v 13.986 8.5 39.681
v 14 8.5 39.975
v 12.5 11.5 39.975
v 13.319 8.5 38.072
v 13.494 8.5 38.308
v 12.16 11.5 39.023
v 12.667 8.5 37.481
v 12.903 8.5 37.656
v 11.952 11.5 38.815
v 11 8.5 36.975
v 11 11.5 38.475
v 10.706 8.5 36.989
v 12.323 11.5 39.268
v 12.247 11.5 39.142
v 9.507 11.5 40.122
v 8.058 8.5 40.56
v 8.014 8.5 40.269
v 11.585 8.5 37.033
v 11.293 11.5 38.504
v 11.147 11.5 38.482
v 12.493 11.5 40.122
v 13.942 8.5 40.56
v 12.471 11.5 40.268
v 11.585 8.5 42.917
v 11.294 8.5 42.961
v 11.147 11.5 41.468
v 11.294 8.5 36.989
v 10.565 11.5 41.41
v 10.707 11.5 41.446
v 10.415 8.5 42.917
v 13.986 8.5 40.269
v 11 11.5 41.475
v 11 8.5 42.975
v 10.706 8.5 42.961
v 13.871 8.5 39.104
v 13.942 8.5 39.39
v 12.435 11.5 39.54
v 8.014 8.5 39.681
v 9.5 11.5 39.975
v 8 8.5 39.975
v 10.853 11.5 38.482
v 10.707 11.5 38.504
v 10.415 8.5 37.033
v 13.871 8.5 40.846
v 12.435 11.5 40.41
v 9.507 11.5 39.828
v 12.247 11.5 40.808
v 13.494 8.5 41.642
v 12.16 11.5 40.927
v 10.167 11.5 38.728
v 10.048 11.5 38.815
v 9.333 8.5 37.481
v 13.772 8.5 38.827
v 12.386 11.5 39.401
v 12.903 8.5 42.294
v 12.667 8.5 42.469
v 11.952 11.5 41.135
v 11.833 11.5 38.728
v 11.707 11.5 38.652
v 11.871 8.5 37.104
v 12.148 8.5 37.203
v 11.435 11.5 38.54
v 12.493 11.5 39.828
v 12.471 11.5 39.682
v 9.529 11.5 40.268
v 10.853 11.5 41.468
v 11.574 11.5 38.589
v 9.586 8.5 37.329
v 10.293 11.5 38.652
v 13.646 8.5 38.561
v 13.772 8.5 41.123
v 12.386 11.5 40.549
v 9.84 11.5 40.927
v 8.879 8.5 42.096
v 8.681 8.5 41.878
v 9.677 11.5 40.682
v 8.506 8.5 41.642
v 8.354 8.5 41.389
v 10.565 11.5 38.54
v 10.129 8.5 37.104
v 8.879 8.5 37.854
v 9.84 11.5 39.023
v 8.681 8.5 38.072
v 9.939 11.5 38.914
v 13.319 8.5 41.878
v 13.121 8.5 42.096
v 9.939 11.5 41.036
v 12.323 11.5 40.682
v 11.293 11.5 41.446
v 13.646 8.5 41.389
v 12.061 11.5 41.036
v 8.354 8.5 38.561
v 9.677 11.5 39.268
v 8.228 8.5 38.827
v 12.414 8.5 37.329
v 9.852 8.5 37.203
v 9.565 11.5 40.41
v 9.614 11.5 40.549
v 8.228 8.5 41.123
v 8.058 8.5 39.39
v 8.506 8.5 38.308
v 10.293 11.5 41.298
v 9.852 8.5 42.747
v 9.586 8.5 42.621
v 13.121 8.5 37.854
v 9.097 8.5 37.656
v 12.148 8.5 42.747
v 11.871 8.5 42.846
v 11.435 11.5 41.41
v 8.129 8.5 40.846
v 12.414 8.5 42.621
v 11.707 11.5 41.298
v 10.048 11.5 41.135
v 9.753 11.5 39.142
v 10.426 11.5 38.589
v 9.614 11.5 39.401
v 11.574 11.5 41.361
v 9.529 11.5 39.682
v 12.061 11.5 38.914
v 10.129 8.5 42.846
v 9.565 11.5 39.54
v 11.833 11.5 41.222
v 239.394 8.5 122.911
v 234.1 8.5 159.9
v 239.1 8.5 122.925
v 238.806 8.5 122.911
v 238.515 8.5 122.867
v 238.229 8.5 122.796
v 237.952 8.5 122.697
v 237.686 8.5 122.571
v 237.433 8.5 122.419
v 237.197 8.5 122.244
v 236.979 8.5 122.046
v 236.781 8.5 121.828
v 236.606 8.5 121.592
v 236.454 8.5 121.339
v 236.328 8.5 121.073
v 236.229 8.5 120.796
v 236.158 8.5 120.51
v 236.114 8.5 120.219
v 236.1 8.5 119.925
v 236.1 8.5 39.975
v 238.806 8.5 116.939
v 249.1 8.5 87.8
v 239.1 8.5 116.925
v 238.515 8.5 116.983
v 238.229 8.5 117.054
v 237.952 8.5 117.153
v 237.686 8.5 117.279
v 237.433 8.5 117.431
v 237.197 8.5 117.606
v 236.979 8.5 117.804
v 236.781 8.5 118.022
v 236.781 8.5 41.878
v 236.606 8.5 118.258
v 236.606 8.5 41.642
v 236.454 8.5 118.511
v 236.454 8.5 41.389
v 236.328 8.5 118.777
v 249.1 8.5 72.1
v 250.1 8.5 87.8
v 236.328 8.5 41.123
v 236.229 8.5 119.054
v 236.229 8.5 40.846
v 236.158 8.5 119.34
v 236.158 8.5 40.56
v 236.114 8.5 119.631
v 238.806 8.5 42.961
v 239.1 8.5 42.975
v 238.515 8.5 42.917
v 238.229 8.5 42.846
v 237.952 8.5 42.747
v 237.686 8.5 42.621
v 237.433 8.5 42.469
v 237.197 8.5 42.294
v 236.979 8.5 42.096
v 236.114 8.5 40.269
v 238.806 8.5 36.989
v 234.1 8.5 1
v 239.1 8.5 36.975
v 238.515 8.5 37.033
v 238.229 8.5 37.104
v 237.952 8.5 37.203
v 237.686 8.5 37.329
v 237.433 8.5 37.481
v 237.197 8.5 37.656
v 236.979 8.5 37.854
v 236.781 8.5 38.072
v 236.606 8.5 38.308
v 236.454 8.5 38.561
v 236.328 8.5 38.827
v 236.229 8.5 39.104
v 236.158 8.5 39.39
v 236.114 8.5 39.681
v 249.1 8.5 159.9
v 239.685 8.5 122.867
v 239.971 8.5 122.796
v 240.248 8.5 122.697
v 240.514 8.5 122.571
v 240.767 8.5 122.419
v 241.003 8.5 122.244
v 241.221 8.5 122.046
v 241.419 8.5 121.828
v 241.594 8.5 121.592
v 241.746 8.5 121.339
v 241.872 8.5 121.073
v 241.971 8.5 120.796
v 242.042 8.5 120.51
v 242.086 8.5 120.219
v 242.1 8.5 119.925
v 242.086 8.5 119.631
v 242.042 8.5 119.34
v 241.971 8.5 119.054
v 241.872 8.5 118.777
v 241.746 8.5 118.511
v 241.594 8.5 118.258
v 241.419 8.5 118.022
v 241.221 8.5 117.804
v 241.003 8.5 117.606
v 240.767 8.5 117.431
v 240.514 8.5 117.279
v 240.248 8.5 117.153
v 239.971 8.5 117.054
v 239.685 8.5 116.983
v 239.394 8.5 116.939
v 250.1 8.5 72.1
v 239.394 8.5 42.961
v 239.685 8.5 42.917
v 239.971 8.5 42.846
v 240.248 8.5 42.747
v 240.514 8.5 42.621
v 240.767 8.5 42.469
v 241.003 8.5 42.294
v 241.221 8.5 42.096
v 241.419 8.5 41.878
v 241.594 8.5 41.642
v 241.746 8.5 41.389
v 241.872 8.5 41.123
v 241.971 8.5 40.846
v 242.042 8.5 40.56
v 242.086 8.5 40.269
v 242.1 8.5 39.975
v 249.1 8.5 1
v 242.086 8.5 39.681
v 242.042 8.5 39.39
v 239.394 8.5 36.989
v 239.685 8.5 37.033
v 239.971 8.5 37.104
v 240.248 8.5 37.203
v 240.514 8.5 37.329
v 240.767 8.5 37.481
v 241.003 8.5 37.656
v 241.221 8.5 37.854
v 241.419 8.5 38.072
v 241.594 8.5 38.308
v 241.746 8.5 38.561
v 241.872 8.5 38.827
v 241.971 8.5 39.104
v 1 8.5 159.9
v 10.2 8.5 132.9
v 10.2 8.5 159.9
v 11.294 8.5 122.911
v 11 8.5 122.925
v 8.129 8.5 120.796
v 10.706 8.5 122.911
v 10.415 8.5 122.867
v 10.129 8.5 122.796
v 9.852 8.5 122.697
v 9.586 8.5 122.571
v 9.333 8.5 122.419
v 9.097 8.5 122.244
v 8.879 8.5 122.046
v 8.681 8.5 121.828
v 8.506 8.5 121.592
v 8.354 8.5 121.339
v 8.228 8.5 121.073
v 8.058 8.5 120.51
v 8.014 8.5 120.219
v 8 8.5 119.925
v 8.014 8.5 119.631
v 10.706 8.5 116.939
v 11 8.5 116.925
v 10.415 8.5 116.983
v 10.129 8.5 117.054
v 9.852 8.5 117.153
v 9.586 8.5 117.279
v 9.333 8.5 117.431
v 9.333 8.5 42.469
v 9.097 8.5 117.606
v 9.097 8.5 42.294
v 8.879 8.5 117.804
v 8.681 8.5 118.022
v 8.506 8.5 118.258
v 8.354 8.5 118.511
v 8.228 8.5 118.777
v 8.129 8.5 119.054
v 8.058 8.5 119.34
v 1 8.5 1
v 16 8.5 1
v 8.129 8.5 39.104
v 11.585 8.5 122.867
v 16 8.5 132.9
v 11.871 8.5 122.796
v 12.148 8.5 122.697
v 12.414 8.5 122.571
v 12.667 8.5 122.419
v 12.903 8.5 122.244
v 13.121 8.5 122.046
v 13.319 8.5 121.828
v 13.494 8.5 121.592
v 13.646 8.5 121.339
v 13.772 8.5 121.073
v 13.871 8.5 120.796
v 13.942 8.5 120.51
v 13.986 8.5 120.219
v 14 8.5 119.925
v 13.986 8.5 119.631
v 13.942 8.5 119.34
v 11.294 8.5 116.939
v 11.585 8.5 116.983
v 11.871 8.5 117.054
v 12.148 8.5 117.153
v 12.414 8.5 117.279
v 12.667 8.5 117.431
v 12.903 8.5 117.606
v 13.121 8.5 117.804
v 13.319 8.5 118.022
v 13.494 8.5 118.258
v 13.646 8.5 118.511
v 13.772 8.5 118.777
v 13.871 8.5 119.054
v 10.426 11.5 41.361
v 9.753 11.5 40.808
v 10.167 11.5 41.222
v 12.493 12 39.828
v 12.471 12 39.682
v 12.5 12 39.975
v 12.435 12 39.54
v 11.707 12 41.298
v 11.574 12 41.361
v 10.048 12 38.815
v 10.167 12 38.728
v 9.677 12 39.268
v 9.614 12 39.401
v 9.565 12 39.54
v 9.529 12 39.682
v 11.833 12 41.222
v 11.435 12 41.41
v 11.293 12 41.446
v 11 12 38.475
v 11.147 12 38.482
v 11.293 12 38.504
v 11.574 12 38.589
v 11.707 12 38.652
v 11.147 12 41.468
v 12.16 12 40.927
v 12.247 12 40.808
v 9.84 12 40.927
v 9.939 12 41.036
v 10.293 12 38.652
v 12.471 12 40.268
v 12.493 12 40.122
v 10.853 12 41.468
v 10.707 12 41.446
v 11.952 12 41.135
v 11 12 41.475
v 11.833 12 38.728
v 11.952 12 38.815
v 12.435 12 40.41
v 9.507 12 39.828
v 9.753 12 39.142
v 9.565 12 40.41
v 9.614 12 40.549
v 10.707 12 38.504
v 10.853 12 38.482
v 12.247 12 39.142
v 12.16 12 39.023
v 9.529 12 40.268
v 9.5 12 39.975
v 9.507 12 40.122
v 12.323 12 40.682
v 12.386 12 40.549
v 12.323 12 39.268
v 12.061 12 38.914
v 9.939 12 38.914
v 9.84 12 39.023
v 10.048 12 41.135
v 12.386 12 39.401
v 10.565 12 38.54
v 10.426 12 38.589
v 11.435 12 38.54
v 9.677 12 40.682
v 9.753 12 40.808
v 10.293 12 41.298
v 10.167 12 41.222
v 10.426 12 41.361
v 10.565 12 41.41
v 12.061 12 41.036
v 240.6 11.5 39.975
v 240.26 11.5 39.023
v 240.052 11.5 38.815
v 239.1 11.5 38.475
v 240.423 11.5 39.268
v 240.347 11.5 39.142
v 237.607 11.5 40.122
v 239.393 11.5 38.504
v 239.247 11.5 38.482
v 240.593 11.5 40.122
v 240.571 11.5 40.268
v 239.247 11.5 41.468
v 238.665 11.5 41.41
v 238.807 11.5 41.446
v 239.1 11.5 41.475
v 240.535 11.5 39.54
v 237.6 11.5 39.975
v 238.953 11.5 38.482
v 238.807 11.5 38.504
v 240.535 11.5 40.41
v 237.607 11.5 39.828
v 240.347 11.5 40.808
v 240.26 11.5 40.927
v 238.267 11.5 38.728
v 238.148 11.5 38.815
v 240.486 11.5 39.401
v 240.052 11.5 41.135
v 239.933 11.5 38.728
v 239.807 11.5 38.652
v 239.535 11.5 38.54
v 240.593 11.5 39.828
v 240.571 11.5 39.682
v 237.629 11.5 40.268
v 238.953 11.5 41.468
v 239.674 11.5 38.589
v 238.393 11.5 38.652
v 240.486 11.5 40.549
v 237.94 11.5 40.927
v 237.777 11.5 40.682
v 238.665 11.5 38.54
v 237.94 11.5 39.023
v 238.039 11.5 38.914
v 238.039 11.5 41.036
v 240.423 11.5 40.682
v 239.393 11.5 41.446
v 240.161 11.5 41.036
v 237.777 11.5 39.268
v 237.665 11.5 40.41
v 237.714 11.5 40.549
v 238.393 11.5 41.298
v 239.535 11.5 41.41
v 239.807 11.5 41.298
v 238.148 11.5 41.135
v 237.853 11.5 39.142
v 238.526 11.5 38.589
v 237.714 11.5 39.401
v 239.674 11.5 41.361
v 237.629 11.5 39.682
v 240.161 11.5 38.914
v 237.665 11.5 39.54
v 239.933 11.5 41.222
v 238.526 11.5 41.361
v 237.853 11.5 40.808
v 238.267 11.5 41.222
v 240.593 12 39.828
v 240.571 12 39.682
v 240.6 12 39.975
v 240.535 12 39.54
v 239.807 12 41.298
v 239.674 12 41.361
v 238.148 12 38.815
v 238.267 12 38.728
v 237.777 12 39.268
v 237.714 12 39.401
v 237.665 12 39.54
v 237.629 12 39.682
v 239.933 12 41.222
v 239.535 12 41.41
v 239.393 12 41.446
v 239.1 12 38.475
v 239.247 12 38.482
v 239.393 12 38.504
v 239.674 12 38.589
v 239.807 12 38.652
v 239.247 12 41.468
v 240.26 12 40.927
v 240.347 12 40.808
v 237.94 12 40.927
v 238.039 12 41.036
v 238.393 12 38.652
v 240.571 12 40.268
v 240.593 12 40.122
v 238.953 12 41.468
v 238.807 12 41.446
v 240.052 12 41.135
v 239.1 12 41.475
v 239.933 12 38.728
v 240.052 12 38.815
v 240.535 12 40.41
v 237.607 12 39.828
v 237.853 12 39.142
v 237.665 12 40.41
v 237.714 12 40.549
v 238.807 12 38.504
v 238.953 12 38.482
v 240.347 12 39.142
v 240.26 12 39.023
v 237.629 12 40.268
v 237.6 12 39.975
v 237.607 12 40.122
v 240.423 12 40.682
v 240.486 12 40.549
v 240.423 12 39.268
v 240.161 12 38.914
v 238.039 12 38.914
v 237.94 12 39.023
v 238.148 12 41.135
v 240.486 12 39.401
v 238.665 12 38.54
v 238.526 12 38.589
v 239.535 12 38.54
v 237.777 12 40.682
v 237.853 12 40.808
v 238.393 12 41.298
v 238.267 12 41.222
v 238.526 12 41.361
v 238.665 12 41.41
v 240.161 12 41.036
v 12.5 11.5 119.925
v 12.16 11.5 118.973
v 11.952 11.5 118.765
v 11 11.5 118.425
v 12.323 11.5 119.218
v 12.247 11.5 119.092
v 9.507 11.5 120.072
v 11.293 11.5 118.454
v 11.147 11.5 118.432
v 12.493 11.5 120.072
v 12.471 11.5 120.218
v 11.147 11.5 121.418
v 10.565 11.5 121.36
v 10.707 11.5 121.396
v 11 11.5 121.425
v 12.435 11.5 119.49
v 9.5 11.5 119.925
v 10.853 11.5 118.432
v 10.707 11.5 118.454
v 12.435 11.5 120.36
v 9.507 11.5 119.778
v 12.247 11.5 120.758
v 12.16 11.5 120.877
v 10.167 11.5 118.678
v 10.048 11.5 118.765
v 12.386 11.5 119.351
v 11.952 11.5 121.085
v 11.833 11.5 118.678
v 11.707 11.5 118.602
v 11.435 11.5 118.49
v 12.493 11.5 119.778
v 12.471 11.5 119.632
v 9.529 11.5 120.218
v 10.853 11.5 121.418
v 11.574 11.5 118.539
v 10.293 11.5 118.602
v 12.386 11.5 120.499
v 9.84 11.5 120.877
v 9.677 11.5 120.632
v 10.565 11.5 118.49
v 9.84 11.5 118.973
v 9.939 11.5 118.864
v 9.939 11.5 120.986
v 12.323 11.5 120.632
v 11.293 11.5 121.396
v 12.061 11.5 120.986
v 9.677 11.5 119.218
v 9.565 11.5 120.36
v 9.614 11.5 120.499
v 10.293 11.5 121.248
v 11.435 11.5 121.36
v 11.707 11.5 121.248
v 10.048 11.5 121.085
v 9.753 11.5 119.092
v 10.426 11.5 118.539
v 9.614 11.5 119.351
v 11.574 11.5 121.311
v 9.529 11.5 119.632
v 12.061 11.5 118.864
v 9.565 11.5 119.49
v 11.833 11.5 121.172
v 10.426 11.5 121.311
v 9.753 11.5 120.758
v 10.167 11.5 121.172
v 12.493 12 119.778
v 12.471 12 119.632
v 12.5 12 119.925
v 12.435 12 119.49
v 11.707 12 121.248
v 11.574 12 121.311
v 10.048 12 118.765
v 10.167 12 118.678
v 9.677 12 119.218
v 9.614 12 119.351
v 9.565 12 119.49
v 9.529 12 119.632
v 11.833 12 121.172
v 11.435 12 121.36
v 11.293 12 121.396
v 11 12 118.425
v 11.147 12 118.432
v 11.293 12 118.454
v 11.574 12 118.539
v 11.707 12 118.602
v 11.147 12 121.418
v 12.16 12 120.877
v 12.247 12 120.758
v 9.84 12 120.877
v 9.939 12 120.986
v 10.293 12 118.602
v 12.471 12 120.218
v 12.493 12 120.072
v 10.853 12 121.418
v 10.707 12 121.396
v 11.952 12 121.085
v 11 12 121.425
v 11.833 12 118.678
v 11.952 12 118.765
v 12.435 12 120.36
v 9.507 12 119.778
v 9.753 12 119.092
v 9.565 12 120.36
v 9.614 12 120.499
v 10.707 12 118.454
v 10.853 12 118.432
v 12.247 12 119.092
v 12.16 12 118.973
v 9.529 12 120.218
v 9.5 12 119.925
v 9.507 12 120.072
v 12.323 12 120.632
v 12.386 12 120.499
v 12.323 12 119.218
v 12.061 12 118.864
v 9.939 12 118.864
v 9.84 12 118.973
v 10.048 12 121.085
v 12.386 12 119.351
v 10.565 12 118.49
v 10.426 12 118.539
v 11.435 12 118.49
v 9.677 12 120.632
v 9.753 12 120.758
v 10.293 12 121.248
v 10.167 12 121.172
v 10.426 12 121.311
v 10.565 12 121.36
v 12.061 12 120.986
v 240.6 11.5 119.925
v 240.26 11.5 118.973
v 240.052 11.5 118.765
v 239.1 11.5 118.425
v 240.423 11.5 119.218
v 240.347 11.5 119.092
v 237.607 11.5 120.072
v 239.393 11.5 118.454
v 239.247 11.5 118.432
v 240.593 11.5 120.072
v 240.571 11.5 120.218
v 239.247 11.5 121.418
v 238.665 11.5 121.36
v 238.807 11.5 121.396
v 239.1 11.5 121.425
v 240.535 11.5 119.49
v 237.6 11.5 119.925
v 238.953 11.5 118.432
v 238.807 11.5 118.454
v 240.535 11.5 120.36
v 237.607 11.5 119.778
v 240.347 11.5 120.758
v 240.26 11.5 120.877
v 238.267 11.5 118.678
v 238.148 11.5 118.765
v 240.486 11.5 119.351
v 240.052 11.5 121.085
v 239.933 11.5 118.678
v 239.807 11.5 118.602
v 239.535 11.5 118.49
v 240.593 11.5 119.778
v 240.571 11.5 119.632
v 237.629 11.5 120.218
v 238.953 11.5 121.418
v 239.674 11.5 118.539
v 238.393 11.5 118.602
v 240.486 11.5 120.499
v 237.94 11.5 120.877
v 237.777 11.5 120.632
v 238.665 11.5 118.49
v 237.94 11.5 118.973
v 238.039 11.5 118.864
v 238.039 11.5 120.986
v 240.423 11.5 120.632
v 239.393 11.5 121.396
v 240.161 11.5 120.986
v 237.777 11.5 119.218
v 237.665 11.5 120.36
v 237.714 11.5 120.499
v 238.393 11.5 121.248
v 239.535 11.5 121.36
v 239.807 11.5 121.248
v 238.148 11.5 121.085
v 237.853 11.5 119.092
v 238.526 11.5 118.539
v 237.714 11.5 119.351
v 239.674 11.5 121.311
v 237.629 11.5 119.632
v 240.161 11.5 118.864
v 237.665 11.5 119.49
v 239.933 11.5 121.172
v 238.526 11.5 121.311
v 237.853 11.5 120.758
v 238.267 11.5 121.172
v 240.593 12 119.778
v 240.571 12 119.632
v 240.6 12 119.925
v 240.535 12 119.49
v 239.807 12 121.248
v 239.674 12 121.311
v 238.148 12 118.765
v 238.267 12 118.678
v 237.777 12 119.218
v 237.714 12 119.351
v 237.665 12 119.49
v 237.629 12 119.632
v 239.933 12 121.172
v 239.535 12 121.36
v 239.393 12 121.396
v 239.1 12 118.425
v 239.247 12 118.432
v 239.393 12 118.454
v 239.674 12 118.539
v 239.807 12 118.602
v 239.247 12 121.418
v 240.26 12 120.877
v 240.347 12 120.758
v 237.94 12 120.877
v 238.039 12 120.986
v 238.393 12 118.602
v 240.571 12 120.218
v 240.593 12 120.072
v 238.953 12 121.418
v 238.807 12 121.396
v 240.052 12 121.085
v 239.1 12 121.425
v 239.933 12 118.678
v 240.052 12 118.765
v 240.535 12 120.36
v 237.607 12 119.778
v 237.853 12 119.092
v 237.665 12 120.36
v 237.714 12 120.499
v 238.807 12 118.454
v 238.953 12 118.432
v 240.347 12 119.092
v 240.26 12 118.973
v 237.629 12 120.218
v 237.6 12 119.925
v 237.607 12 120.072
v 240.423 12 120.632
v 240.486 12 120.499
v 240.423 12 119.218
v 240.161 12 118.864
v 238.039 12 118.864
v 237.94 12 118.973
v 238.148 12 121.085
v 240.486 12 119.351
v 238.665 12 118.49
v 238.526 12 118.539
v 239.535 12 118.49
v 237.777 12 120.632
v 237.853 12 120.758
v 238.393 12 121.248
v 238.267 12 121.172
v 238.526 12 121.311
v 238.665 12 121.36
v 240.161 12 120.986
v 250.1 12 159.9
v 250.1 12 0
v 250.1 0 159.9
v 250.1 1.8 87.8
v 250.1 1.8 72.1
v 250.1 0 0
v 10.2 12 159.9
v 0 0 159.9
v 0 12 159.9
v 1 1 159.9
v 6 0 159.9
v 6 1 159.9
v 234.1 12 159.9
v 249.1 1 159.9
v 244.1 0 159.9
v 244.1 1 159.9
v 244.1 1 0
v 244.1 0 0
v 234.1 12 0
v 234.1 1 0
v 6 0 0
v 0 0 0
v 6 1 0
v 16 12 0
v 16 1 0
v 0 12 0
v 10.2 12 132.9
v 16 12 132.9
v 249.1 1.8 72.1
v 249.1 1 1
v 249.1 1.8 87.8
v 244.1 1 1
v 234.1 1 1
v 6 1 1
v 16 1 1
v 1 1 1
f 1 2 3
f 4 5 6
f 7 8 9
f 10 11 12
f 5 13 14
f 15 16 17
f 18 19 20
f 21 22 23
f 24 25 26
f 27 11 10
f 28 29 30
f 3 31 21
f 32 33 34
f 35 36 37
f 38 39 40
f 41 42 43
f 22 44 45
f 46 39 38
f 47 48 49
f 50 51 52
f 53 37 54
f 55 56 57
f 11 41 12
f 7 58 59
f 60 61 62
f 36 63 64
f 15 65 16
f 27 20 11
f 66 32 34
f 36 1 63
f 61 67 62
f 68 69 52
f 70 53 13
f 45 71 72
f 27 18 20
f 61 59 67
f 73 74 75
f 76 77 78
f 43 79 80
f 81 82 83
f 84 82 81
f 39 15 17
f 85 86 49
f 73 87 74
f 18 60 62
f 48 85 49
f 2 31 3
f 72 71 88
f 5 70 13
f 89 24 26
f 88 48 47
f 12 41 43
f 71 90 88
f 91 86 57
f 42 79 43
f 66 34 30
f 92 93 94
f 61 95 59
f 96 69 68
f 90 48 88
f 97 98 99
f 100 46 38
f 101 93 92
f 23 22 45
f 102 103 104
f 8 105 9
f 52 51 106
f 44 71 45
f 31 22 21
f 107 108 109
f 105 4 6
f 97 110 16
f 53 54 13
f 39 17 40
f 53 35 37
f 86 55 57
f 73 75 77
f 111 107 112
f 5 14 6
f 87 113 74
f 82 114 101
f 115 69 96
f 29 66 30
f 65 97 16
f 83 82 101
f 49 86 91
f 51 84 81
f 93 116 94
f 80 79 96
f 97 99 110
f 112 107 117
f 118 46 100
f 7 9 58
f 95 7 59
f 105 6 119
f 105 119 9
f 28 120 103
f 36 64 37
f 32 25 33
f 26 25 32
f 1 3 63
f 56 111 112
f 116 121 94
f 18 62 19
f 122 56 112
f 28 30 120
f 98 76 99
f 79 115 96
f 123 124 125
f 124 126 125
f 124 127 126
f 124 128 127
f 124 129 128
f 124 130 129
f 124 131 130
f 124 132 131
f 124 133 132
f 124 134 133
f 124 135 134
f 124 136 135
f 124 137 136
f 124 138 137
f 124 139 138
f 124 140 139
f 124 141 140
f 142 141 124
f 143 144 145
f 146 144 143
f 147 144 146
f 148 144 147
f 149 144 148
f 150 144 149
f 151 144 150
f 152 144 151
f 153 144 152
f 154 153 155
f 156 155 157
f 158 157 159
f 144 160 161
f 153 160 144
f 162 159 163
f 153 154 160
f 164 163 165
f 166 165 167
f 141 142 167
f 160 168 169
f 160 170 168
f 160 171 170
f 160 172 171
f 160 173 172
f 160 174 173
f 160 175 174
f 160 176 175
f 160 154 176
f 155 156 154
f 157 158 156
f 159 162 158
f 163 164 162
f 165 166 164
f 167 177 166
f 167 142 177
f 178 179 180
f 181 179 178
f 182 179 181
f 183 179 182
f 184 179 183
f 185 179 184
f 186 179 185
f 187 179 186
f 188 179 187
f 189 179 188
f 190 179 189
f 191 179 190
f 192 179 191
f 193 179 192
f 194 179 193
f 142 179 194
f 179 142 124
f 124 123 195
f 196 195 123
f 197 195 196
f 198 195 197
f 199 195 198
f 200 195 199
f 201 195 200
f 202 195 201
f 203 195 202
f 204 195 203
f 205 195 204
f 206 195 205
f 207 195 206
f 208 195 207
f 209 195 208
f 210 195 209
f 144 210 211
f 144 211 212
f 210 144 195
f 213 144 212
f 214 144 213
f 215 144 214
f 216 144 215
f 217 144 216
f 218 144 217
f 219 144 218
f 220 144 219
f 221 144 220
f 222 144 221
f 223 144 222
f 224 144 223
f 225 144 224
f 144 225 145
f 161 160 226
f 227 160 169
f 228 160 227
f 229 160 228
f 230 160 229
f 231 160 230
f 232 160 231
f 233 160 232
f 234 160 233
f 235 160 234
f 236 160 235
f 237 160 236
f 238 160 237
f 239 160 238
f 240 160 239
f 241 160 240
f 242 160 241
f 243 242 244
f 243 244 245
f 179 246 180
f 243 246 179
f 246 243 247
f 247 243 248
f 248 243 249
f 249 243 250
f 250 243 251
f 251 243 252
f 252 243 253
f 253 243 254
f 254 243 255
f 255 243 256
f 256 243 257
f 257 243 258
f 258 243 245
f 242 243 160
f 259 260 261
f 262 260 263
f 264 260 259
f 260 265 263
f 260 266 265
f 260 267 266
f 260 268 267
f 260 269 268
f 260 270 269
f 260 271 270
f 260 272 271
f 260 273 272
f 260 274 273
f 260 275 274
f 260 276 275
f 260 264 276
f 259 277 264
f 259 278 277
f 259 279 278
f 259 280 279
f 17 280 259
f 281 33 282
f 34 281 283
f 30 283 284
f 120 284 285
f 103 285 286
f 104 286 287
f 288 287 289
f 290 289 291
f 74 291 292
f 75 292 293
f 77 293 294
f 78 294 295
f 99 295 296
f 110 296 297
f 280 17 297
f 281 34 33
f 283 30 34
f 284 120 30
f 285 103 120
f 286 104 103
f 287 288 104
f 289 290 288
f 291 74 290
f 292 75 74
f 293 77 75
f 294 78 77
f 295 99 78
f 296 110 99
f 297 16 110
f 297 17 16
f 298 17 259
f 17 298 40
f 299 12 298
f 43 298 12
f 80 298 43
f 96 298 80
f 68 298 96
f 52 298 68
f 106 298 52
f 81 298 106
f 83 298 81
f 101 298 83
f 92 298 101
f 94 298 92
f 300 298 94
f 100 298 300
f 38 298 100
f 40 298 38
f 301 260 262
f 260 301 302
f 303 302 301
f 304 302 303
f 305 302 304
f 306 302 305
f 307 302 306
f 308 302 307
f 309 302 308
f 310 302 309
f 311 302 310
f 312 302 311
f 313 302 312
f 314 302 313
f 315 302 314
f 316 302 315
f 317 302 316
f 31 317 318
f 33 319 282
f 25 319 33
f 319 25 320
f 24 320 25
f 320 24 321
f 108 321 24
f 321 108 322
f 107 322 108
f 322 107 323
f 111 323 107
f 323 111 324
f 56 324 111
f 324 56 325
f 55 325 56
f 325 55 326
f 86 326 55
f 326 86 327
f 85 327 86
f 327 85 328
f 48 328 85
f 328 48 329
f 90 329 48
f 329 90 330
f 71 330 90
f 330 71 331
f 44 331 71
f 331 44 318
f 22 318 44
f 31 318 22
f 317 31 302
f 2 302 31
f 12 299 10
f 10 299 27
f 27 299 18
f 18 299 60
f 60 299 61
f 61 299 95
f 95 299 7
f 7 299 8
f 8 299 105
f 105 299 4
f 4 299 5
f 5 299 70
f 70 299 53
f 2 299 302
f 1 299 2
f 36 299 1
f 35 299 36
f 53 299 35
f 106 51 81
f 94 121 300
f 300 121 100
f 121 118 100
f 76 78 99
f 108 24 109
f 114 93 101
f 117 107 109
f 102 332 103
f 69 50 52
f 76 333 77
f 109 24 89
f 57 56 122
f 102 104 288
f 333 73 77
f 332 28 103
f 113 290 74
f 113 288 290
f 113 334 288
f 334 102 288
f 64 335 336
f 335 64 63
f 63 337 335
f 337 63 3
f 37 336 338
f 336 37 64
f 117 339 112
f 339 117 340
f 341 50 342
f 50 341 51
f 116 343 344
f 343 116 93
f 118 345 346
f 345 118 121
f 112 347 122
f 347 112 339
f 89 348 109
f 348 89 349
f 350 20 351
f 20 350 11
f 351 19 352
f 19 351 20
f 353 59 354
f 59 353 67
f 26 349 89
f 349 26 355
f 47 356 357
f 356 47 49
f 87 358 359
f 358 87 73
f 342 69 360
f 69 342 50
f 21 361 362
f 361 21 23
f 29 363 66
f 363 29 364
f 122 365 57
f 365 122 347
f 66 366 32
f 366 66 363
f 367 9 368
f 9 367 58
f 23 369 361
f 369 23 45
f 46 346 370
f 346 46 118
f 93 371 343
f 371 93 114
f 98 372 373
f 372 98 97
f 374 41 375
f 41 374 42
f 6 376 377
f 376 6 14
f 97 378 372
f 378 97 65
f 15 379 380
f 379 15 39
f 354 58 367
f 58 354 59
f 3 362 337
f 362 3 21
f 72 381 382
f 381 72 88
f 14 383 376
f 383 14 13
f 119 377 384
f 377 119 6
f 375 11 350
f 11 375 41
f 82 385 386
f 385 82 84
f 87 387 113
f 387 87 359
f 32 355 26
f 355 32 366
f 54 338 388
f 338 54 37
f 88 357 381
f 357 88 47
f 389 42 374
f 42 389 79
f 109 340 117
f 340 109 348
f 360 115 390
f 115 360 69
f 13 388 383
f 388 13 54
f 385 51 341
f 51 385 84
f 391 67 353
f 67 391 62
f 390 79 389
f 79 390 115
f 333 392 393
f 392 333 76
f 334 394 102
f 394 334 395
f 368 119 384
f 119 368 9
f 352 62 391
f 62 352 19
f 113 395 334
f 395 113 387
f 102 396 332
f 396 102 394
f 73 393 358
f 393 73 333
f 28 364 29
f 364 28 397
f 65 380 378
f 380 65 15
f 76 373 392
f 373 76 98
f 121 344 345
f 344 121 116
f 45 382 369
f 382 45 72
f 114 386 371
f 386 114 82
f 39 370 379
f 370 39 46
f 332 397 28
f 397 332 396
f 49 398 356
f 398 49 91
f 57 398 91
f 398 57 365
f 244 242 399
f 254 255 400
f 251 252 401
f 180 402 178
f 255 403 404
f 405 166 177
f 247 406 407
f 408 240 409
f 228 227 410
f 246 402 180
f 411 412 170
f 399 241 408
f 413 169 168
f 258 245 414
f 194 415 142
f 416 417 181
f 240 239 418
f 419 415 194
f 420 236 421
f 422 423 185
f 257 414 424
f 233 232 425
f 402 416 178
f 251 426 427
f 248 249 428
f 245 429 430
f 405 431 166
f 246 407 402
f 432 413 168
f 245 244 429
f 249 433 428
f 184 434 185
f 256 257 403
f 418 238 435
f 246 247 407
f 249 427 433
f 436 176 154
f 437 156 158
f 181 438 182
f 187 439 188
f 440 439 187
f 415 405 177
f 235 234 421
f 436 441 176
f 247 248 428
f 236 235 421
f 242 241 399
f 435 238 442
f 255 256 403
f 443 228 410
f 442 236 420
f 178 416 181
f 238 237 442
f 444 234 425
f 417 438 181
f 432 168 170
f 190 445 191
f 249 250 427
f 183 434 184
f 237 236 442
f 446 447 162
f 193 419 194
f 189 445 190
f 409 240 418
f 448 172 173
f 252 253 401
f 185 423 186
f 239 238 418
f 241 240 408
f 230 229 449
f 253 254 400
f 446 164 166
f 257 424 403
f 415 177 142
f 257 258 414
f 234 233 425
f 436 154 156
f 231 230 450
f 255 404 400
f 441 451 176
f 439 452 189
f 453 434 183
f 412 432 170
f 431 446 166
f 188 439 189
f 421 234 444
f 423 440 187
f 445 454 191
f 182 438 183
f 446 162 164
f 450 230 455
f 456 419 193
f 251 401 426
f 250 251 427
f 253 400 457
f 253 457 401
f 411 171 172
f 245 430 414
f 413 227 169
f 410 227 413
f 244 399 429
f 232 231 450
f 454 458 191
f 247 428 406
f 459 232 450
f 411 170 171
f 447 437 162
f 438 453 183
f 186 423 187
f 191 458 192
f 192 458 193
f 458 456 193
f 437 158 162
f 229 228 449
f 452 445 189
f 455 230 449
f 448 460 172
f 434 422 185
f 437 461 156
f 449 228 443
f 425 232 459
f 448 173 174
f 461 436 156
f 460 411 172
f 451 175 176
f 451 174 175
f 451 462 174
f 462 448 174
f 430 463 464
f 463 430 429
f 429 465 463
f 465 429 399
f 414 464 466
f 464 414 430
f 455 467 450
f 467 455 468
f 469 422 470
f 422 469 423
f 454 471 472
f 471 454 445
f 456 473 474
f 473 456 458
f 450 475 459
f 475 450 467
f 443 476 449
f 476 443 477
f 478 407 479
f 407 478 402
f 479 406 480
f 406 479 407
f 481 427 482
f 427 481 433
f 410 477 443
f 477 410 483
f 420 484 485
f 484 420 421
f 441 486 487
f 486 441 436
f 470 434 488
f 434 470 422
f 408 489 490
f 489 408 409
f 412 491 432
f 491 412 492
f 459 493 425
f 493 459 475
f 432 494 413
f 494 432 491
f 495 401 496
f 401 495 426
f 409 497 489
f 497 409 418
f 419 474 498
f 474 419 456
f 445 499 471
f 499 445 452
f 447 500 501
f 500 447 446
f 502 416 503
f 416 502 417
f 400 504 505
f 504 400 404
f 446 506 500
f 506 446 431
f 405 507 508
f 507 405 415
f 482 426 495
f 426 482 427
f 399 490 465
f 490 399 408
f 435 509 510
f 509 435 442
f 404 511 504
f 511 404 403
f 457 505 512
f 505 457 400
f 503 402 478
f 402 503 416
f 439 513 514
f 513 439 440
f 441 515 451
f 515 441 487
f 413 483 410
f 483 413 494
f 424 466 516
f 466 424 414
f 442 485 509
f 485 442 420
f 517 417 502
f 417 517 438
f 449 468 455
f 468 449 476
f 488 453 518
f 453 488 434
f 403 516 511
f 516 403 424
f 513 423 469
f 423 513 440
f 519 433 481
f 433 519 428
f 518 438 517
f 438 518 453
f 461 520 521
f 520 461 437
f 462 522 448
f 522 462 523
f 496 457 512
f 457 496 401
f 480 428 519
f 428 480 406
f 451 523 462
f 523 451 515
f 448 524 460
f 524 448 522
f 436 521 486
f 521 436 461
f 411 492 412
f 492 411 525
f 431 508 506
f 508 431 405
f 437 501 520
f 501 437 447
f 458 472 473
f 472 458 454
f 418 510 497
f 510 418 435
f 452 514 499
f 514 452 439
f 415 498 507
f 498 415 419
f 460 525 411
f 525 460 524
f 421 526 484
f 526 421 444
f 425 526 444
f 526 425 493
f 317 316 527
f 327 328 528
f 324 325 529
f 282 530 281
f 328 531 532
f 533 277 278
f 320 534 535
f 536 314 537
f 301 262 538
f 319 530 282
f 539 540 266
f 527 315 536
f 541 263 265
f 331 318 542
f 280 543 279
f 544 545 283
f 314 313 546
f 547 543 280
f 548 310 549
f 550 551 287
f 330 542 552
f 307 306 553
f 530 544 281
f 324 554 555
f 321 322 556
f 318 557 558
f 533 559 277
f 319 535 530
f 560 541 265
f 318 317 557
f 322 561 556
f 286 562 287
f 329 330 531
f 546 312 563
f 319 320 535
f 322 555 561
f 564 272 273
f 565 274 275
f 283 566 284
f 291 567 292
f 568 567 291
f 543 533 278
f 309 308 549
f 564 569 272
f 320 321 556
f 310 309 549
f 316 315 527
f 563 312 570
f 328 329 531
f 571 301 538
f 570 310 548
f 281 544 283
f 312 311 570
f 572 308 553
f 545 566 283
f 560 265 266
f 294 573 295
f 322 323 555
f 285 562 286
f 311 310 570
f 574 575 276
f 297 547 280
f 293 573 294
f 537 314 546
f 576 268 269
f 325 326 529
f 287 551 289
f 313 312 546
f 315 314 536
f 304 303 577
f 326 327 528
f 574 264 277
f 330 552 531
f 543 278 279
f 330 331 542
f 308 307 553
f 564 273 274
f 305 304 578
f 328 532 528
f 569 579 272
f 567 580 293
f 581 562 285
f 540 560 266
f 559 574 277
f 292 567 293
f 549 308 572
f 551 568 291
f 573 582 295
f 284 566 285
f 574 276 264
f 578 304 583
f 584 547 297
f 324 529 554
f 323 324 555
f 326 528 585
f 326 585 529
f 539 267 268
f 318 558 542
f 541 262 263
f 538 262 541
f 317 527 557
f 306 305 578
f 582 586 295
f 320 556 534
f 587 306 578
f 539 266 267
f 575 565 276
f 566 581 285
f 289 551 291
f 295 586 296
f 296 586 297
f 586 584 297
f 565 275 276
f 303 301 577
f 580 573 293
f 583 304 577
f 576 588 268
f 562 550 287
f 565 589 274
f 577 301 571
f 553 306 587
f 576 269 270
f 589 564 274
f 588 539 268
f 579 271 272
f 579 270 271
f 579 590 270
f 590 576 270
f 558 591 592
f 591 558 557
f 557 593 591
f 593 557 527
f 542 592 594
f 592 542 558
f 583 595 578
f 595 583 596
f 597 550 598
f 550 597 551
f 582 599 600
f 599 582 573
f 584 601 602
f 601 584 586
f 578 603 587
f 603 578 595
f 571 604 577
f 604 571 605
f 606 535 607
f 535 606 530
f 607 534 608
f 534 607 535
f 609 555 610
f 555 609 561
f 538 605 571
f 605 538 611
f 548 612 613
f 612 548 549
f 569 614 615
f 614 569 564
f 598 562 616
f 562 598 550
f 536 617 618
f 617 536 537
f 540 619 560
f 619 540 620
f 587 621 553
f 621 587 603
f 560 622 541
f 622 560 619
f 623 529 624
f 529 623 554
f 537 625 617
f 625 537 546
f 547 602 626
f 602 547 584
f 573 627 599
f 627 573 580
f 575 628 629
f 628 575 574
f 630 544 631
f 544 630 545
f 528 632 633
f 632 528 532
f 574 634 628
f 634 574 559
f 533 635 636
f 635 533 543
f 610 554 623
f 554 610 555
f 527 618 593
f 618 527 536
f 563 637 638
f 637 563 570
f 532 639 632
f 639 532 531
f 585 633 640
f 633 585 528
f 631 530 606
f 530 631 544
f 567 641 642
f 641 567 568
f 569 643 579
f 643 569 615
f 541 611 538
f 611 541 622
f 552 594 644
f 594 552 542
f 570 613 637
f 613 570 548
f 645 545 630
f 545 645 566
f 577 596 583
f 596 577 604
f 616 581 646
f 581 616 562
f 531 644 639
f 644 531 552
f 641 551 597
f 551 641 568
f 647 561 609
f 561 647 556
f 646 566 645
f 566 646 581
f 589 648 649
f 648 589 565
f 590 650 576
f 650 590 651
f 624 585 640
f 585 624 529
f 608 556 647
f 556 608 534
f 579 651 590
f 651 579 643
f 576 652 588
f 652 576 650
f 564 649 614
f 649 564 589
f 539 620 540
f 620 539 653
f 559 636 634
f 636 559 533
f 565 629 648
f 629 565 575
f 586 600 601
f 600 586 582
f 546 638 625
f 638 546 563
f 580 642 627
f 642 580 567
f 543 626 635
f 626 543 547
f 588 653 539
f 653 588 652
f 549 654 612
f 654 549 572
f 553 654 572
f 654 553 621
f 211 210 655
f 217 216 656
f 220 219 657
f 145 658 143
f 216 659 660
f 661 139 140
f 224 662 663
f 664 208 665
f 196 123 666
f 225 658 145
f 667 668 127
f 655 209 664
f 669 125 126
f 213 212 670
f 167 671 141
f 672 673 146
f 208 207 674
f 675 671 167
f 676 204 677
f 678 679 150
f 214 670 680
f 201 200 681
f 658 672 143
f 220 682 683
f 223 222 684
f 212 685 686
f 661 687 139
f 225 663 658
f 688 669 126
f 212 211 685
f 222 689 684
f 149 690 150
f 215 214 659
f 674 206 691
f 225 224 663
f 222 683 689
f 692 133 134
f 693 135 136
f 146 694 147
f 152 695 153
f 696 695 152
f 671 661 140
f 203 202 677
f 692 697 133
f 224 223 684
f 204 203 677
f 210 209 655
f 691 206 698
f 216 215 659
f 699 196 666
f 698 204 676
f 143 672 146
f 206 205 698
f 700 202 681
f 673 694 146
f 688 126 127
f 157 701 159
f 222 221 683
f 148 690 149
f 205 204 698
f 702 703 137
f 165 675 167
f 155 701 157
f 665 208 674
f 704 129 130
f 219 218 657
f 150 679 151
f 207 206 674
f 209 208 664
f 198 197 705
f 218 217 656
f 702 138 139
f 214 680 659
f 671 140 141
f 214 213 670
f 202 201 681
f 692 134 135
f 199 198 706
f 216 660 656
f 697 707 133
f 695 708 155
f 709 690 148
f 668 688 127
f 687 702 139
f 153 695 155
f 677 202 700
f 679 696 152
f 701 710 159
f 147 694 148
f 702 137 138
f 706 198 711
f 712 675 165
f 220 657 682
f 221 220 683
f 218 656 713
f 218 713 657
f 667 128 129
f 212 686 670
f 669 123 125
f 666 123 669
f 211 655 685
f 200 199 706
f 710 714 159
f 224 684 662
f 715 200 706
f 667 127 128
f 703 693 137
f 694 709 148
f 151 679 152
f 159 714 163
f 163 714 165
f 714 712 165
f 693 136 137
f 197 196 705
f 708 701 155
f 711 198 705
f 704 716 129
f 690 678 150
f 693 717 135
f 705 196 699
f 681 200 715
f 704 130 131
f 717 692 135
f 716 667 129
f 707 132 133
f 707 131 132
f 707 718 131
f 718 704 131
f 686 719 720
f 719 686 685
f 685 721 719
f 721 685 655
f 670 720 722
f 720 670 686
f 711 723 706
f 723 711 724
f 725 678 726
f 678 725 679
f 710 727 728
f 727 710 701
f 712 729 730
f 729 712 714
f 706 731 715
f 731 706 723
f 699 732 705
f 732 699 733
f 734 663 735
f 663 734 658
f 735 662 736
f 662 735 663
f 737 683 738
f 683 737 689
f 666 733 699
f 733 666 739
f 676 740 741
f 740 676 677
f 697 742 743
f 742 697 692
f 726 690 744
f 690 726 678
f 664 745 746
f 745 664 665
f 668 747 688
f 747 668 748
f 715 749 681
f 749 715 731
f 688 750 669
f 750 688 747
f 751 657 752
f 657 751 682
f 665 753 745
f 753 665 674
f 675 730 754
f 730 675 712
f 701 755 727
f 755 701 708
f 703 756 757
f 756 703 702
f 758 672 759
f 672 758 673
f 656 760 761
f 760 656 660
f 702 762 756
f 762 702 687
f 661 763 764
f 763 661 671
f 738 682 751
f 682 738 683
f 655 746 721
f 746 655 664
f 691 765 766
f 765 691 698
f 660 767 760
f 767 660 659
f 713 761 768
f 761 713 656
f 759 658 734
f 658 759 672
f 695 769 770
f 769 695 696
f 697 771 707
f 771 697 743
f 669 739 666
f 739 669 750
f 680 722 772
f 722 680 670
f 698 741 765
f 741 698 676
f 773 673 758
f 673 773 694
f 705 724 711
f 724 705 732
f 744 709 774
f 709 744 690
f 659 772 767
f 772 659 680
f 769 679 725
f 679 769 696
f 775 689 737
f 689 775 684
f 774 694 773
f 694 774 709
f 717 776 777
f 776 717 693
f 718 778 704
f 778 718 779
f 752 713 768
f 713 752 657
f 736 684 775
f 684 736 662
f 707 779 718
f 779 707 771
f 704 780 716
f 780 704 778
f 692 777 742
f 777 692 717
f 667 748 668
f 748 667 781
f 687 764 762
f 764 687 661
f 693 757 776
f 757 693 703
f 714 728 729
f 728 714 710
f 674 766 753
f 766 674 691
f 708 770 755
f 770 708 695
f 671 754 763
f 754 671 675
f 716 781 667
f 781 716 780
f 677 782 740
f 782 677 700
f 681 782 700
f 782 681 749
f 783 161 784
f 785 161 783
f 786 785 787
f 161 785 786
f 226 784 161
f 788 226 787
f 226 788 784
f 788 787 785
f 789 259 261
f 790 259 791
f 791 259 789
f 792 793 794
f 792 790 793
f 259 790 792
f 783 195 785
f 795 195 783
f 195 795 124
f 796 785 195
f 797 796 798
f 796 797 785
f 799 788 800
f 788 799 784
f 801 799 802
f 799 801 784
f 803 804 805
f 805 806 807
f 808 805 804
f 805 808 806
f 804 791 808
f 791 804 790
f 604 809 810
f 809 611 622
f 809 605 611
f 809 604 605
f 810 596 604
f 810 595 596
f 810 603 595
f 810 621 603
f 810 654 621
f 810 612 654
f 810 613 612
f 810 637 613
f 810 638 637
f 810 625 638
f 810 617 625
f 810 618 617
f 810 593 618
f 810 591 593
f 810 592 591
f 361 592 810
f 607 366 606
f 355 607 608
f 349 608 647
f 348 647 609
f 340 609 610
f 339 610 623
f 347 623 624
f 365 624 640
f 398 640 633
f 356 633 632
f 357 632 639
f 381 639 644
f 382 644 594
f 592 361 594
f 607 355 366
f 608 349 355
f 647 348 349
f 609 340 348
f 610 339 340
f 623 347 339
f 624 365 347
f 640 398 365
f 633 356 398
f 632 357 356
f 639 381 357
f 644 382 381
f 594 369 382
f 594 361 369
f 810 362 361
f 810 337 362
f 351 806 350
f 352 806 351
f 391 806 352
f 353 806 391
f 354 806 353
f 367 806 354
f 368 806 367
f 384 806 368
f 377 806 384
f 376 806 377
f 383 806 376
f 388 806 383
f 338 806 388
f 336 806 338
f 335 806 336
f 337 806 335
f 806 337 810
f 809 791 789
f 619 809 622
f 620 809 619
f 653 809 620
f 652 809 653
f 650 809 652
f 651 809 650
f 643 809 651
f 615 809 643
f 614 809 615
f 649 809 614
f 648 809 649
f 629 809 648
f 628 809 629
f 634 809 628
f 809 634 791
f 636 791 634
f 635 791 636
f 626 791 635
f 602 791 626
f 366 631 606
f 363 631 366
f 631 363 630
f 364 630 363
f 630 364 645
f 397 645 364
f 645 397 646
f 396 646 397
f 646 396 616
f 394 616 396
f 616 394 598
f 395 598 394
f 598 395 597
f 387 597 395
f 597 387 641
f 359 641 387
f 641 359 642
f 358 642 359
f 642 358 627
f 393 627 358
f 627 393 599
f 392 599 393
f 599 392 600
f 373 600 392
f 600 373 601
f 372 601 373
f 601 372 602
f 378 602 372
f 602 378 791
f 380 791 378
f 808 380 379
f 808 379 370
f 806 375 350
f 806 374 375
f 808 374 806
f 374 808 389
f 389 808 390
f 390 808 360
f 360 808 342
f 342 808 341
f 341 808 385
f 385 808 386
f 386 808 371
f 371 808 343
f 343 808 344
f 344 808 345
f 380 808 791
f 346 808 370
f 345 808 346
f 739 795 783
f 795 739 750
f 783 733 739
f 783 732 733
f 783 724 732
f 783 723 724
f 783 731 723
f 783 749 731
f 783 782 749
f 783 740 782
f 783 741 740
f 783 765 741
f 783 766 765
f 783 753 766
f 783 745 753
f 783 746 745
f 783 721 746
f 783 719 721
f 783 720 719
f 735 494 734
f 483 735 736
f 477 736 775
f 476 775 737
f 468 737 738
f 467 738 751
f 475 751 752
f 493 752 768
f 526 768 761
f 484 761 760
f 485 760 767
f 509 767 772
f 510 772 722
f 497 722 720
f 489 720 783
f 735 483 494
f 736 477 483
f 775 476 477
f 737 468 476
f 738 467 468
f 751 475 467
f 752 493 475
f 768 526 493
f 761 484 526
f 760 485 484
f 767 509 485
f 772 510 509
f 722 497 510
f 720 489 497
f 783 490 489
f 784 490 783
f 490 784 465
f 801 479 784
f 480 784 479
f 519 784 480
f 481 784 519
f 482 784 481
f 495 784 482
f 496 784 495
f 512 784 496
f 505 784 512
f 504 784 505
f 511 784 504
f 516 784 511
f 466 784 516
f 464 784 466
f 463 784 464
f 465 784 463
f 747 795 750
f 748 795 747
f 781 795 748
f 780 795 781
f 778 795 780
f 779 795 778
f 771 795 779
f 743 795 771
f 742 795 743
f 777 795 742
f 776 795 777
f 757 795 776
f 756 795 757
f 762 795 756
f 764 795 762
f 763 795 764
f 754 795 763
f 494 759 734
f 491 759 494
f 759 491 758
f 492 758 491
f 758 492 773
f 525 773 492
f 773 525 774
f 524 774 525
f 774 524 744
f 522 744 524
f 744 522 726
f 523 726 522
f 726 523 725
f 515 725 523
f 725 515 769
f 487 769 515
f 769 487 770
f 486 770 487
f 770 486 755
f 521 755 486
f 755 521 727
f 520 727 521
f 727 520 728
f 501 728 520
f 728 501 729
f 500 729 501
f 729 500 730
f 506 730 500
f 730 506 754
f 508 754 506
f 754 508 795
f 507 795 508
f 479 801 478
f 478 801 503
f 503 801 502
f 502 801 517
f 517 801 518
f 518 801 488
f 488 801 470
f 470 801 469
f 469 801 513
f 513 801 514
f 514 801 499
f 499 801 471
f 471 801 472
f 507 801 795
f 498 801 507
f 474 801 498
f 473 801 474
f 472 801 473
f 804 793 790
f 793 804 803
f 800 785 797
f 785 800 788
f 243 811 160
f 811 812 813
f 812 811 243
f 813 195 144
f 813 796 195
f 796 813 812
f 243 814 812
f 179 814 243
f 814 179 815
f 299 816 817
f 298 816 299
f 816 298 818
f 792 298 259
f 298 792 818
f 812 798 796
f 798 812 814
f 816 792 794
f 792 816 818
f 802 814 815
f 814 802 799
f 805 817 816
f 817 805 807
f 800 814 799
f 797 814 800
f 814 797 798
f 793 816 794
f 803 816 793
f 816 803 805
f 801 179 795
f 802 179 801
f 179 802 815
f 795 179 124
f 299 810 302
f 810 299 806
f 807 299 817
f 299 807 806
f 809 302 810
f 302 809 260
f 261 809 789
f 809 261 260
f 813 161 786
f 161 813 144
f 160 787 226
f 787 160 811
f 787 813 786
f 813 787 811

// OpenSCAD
$fn = 64;

// Samsung Galaxy Tab A7 SM-T500
TABLET_WIDTH = 247.6;
TABLET_HEIGHT = 157.4;
TABLET_DEPTH = 7;

CAMERA_OFFSET_X = 9.2;
CAMERA_CUTOUT_HEIGHT = 27;
CAMERA_CUTOUT_WIDTH = 27;

CHARGER_CUTOUT_DEPTH = 6.7;
CHARGER_CUTOUT_HEIGHT = 15.7;

WALL_THICKNESS = 1;
LIP_THICKNESS = 1;
BACK_THICKNESS = 3.5;
LIP = 5;

BRACKET_WIDTH = 16;
BOTTOM_BRACKET_HEIGHT = 0;
TOP_BRACKET_HEIGHT = 0;

TOLERANCE = 0.25;

tablet_cutout_width = TABLET_WIDTH + 2 * TOLERANCE;
tablet_cutout_height = TABLET_HEIGHT + 2 * TOLERANCE;
tablet_cutout_depth = TABLET_DEPTH + 2 * TOLERANCE;

total_width = tablet_cutout_width + 2 * WALL_THICKNESS;
total_depth = tablet_cutout_depth + LIP_THICKNESS + BACK_THICKNESS;
total_height = tablet_cutout_height + 2 * WALL_THICKNESS;

bottom_lip_height = min(LIP, BOTTOM_BRACKET_HEIGHT-WALL_THICKNESS);
top_lip_height = min(LIP, TOP_BRACKET_HEIGHT-WALL_THICKNESS);


difference() {
    cube([total_width, total_depth, total_height]);

    // Tablet cutout
    translate([WALL_THICKNESS, LIP_THICKNESS, WALL_THICKNESS])
        cube([tablet_cutout_width, tablet_cutout_depth, tablet_cutout_height]);

    // Display cutout
    translate([WALL_THICKNESS+LIP, 0, WALL_THICKNESS+bottom_lip_height])
        cube([tablet_cutout_width - 2 * LIP, LIP_THICKNESS, tablet_cutout_height - bottom_lip_height - top_lip_height]);

    // Open the top
    translate([WALL_THICKNESS, LIP_THICKNESS, tablet_cutout_height + WALL_THICKNESS])
        cube([tablet_cutout_width, tablet_cutout_depth, WALL_THICKNESS]);

    // Punchout the back
    translate([BRACKET_WIDTH, 0, BOTTOM_BRACKET_HEIGHT])
        cube([tablet_cutout_width + 2 * WALL_THICKNESS - 2 * BRACKET_WIDTH, tablet_cutout_depth + LIP_THICKNESS + BACK_THICKNESS, tablet_cutout_height  + 2 * WALL_THICKNESS - BOTTOM_BRACKET_HEIGHT - TOP_BRACKET_HEIGHT]);

    // Camera cutout
    translate([WALL_THICKNESS + CAMERA_OFFSET_X, total_depth - BACK_THICKNESS, total_height - CAMERA_CUTOUT_HEIGHT])
        cube([CAMERA_CUTOUT_WIDTH, BACK_THICKNESS, CAMERA_CUTOUT_HEIGHT]);

    // Charger cutout
    translate([total_width - WALL_THICKNESS, LIP_THICKNESS + tablet_cutout_depth - CHARGER_CUTOUT_DEPTH, (total_height - CHARGER_CUTOUT_HEIGHT) / 2])
        cube([WALL_THICKNESS, CHARGER_CUTOUT_DEPTH, CHARGER_CUTOUT_HEIGHT]);

    // Screw holes
    translate([0, total_depth - BACK_THICKNESS, 0])
        corner_offsets(total_width, total_height, width_offset = BRACKET_WIDTH - (BRACKET_WIDTH - WALL_THICKNESS - LIP) / 2 )
            render()
            rotate([-90, 0, 0])
                metric_screw_hole(3, 6, 3);
}


module metric_screw_hole(dia, head_dia, head_length, length=1000) {
        cylinder(d2=dia, d1=head_dia, h=head_length);
        translate([0, 0, head_length])
            cylinder(d=dia, h=length-head_length);
}

module corner_offsets(total_width, total_height, width_offset=0, height_offset=0) {
    height_offset = height_offset > 0 ? height_offset : total_height/4;
    width_offset = width_offset > 0 ? width_offset : total_width/4;

    translate([width_offset, 0, height_offset])
        children();

    translate([total_width - width_offset, 0, height_offset])
        children();

    translate([width_offset, 0, total_height - height_offset])
        children();

    translate([total_width - width_offset, 0, total_height - height_offset])
        children();
}
